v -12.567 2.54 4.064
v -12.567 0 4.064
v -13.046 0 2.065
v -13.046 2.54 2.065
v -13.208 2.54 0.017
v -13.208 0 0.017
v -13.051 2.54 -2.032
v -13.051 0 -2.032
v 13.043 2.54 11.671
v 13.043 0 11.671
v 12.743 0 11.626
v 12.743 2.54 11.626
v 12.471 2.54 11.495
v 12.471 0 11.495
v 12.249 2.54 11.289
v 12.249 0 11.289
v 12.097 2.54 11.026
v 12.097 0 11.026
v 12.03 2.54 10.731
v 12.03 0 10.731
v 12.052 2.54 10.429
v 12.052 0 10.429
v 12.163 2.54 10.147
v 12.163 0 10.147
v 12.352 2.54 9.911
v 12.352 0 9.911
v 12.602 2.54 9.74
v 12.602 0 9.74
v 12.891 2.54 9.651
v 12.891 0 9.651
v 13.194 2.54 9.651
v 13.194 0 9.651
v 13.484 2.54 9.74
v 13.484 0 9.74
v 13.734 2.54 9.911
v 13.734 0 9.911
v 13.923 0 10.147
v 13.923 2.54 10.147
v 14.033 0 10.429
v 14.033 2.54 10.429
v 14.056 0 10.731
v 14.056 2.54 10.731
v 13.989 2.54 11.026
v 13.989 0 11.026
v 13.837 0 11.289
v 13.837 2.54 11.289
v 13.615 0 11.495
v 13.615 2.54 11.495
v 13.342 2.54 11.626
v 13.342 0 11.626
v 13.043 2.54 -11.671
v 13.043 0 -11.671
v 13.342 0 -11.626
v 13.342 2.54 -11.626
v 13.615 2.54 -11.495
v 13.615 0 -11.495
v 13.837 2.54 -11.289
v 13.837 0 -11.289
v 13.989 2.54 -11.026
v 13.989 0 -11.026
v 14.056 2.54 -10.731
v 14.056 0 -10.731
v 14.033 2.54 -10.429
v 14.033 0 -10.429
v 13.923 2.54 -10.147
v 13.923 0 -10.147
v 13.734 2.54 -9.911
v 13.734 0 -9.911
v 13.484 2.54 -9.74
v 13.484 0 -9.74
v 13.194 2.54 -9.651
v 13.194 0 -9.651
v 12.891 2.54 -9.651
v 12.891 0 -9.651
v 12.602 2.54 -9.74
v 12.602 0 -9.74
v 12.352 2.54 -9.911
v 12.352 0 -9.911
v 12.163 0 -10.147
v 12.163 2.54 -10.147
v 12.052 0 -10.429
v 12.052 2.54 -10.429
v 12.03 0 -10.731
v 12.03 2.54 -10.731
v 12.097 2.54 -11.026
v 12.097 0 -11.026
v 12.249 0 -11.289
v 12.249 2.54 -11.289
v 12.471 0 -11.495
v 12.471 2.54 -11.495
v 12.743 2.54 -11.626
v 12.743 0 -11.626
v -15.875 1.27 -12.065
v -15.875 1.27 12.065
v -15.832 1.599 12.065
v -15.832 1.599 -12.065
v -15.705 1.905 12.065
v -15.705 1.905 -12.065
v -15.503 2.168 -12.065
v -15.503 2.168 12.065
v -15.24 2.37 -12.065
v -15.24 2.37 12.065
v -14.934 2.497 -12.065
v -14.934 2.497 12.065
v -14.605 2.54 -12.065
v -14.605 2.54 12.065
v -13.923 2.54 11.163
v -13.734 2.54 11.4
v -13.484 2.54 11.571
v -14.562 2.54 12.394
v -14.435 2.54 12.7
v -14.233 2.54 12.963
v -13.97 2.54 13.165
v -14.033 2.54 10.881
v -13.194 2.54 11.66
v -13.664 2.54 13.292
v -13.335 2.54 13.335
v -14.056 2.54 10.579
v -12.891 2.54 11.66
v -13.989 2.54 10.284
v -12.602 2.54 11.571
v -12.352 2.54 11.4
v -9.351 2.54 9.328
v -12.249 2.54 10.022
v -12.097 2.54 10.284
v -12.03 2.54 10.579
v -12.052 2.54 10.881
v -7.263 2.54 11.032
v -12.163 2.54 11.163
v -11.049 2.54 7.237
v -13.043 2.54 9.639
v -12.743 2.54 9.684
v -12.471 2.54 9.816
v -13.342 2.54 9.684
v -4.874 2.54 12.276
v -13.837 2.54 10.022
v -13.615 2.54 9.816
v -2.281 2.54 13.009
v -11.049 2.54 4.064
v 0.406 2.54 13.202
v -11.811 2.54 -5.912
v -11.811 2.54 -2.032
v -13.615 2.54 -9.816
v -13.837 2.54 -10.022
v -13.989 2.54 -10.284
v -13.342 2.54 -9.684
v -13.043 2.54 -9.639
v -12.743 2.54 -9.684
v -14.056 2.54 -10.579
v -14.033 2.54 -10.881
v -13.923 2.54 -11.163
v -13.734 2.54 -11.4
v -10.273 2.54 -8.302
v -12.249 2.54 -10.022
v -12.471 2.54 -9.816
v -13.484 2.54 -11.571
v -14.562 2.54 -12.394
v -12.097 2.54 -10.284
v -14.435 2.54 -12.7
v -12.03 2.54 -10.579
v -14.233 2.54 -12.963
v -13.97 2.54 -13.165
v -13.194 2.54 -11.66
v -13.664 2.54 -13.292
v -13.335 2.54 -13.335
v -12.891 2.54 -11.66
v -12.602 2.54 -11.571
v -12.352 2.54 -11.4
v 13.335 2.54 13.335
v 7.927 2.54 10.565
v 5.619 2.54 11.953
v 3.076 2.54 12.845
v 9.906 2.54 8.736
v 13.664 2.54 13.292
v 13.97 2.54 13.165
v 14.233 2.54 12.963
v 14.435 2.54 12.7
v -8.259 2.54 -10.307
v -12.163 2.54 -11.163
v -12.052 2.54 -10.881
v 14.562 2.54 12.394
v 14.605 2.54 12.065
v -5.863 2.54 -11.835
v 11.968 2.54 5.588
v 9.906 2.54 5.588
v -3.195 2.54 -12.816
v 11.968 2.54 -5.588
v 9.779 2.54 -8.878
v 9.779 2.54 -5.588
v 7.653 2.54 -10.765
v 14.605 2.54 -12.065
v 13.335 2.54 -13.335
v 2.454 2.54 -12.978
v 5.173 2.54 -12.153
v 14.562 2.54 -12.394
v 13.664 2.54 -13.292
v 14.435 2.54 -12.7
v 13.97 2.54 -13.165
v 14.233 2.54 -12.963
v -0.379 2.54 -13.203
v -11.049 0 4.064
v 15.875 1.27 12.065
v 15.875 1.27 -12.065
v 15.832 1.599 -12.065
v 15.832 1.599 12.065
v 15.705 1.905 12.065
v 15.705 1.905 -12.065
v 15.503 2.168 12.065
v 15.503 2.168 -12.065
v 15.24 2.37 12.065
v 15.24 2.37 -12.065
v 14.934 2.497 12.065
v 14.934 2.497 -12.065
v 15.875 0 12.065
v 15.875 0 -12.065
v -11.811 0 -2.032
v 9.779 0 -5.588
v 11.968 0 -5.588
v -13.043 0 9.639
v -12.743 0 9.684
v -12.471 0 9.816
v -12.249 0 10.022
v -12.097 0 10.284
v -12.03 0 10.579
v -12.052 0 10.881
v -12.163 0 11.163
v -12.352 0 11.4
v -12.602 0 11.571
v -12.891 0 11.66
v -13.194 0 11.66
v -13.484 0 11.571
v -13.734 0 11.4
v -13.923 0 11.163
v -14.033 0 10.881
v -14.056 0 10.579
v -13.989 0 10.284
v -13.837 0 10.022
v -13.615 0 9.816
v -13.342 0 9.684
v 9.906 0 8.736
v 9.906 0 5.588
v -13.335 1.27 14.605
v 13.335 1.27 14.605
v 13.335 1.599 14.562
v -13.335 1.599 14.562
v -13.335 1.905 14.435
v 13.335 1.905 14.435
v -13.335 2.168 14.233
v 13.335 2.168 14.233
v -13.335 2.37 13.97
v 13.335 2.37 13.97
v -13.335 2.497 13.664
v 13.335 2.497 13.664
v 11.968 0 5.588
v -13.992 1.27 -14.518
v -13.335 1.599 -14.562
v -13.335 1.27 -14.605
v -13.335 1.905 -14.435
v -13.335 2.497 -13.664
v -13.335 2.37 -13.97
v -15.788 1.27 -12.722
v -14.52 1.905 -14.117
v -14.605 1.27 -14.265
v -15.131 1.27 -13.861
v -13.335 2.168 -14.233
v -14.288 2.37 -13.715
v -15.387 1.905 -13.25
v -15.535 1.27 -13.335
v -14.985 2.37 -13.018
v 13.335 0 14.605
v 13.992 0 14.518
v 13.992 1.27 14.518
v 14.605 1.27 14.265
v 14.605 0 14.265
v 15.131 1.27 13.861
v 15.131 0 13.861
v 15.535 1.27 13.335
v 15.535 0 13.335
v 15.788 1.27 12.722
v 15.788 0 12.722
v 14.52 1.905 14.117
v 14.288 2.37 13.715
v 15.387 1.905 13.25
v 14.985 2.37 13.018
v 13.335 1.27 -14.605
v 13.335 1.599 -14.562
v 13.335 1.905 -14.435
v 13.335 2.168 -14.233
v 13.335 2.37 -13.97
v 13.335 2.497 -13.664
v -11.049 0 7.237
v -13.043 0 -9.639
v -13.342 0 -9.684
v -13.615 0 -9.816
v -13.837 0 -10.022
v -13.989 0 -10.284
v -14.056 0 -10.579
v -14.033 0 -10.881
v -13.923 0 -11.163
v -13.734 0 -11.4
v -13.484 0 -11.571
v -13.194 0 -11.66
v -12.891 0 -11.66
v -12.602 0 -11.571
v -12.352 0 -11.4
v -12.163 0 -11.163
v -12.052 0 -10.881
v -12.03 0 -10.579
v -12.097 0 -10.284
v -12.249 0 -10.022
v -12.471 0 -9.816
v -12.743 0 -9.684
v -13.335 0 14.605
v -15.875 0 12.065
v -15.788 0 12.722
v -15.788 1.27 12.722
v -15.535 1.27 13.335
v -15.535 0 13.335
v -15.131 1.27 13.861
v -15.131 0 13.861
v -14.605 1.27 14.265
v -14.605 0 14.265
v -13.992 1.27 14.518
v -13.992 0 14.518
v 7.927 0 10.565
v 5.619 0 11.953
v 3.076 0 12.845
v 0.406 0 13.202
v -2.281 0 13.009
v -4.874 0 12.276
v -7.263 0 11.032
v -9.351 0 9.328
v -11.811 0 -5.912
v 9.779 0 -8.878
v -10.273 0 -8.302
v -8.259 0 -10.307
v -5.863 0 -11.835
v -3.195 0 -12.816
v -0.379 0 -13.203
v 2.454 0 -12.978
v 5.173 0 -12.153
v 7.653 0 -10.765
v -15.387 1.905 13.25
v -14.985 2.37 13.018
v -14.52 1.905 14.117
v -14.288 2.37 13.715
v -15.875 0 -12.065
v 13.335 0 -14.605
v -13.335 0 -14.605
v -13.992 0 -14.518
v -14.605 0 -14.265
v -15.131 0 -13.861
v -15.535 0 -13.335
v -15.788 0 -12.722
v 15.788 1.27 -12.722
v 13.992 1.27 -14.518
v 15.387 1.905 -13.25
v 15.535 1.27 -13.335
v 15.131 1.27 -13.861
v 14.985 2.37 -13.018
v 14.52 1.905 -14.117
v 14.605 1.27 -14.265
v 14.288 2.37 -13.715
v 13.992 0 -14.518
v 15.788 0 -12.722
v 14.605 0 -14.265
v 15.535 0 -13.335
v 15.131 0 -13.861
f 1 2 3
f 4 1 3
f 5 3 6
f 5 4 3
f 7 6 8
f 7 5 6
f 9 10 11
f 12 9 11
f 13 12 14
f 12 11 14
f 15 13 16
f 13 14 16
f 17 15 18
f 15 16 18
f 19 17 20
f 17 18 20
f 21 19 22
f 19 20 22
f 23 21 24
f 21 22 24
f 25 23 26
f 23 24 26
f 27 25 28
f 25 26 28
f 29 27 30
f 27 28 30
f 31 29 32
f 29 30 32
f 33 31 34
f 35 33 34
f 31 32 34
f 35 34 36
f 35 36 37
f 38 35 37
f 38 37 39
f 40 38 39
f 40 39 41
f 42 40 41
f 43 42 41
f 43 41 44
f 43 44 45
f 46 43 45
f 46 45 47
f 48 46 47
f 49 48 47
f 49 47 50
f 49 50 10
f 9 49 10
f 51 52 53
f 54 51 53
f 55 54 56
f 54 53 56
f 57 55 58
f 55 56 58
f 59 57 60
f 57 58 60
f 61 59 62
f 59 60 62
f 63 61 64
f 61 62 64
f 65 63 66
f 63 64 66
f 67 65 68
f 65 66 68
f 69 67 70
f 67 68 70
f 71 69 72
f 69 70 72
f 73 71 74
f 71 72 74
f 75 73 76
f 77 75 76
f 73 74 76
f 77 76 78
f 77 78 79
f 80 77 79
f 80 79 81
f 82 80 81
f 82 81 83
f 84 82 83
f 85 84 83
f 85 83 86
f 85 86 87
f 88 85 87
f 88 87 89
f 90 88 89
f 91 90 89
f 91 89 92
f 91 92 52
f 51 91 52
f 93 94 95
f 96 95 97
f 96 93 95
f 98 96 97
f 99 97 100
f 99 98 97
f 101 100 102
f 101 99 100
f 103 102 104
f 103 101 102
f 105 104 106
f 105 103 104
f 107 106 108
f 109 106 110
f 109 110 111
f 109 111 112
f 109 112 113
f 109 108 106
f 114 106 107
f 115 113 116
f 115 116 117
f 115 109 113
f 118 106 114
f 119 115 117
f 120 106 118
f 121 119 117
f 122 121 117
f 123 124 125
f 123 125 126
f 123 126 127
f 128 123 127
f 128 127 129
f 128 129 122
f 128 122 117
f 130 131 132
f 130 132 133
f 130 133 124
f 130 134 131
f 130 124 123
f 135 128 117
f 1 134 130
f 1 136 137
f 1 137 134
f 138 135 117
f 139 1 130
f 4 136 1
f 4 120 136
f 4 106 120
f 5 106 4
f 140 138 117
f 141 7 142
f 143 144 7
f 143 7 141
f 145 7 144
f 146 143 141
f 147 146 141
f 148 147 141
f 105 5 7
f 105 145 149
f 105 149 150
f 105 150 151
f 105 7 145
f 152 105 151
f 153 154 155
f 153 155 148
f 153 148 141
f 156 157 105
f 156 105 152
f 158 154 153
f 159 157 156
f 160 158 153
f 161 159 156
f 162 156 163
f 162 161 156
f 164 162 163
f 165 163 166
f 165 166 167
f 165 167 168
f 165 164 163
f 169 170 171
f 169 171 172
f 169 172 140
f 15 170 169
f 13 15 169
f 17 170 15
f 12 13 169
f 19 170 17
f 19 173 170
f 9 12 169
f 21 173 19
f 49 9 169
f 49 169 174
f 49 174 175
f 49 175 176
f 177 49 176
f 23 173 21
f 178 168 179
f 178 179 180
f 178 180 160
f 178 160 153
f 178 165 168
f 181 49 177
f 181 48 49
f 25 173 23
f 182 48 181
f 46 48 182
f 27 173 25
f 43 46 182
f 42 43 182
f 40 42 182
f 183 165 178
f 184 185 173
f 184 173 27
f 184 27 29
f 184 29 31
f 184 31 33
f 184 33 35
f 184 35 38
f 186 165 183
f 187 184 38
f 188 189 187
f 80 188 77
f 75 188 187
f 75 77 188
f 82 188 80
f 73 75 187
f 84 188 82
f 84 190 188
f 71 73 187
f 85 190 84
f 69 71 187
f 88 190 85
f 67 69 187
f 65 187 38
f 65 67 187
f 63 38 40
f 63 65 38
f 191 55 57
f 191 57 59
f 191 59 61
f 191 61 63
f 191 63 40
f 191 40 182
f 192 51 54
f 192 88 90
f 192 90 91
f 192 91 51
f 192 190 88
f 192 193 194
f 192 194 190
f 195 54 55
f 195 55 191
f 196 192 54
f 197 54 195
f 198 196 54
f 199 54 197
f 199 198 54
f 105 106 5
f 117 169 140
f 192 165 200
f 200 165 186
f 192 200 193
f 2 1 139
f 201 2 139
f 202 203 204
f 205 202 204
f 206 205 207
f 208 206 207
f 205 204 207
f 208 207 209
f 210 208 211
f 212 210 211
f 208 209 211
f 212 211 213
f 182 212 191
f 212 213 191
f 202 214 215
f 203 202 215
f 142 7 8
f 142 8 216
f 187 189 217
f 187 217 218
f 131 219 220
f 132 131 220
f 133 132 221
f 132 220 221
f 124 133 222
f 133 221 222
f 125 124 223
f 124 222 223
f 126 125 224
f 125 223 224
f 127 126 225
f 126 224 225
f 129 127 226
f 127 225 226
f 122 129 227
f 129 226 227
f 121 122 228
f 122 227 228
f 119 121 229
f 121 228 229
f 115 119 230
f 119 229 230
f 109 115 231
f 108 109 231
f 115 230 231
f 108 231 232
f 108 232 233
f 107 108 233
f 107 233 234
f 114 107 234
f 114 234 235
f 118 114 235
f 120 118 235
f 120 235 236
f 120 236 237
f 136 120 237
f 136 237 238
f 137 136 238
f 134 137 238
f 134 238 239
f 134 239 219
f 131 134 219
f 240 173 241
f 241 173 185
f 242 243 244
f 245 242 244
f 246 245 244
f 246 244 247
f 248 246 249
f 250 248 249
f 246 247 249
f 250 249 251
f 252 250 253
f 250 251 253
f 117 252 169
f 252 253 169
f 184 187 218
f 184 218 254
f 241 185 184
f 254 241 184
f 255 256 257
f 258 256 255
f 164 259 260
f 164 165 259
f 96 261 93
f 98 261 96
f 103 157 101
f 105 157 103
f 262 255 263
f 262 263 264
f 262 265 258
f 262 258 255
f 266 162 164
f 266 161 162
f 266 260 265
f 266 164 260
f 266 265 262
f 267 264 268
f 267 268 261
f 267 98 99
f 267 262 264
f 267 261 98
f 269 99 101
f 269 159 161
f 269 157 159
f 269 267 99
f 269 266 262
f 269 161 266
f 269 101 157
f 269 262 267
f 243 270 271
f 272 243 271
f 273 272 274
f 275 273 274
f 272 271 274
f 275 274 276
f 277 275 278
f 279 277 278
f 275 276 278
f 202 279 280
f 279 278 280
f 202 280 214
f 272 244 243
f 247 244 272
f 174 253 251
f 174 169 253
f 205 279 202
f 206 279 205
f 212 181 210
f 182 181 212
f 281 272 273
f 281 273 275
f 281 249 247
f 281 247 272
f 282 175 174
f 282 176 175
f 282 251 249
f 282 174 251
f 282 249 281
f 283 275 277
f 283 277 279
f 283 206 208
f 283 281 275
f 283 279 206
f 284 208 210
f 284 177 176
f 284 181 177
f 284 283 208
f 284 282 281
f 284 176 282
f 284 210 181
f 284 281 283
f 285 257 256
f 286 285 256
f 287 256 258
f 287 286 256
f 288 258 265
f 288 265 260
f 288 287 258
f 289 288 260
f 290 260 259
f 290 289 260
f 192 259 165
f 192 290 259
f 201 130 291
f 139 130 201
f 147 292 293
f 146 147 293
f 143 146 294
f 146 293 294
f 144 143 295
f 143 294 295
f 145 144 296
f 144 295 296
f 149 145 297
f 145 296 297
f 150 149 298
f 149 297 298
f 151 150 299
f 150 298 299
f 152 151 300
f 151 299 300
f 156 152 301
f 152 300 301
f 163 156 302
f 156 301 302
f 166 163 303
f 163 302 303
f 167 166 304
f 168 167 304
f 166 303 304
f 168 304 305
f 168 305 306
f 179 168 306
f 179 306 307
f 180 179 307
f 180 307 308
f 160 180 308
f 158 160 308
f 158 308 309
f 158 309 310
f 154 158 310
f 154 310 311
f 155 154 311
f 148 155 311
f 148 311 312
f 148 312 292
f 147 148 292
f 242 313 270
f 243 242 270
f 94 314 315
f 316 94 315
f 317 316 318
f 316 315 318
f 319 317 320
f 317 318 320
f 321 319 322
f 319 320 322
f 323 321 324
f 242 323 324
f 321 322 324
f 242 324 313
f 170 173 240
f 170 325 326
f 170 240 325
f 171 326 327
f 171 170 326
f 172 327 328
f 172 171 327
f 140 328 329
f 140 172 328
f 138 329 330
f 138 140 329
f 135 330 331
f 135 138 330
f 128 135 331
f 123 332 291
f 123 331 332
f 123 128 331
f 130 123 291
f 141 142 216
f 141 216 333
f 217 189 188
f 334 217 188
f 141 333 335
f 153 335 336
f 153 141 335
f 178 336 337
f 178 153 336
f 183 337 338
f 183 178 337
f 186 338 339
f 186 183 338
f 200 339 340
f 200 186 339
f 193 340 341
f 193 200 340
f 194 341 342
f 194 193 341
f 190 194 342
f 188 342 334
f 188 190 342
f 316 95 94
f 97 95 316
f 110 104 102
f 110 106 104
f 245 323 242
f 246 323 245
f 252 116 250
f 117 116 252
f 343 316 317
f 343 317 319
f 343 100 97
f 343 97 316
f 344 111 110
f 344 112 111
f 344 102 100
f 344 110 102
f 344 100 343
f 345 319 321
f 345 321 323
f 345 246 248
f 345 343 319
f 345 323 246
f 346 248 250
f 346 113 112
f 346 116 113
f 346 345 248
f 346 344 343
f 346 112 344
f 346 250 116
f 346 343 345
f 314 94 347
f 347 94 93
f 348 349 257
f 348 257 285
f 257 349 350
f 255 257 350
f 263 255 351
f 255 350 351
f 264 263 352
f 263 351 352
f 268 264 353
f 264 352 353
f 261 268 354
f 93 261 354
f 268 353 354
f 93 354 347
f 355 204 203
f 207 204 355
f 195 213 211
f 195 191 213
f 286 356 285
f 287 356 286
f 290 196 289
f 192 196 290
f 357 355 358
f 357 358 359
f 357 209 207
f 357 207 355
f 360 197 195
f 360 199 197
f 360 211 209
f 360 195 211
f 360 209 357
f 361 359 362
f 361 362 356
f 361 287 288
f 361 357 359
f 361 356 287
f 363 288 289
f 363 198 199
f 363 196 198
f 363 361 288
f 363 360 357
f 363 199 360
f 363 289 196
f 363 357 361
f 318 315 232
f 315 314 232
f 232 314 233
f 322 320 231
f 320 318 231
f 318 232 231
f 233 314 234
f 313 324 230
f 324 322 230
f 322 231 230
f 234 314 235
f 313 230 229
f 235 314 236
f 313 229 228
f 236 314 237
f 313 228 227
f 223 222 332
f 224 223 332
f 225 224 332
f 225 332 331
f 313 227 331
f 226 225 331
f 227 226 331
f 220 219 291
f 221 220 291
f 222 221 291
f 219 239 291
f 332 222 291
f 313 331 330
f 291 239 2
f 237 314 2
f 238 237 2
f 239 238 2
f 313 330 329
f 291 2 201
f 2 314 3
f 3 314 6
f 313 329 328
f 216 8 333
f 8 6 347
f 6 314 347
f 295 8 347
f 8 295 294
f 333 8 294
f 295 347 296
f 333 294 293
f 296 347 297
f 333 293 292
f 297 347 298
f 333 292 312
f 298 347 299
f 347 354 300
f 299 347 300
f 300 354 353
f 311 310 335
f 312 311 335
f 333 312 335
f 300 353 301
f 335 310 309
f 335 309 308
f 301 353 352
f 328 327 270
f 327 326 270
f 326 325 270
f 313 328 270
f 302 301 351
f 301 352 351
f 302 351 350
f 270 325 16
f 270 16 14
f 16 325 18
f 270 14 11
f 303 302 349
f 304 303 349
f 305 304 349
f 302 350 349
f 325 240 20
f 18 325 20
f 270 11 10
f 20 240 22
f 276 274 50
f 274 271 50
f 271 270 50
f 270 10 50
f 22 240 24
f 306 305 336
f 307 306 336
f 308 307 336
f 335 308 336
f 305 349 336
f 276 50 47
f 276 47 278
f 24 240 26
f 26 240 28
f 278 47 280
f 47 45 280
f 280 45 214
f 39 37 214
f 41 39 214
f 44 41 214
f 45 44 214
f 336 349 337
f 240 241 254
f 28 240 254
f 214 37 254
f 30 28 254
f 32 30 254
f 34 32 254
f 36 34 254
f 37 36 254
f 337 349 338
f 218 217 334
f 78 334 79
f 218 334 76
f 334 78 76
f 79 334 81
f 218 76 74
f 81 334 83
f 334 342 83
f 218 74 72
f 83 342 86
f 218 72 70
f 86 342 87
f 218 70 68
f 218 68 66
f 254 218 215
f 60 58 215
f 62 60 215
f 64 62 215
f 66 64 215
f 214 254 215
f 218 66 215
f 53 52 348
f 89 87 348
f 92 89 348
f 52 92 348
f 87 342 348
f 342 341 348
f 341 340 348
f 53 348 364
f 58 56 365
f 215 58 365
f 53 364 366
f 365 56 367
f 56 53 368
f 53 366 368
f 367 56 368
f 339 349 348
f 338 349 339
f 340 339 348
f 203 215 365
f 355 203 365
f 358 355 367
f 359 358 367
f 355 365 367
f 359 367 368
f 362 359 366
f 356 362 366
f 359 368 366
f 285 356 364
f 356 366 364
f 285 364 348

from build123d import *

# Parameters (mm, degrees)
SKETCH1_W           = 31.75
SKETCH1_H           = 29.21
BOSS_EXTRUDE1_DEPTH = 2.54
CUT_EXTRUDE1_DEPTH  = 22.720341848
SKETCH3_W           = 4.064
SKETCH3_H           = 4.263952617
SKETCH3_W_2         = 4.826
SKETCH3_H_2         = 10.541
SKETCH3_W_3         = 5.969
SKETCH3_H_3         = 4.464530762
SKETCH3_W_4         = 6.096
SKETCH3_H_4         = 4.639521707
BOSS_EXTRUDE2_DEPTH = 2.54
FILLET1_R           = 1.27
SKETCH5_R           = 1.016
CUT_EXTRUDE3_DEPTH  = 22.720341848
FILLET2_R           = 2.54


with BuildPart() as part:
    # Sketch1 → Boss-Extrude1 (new body)
    with BuildSketch(Plane(origin=(0, 0, 0), x_dir=(1, 0, 0), z_dir=(0, 1, 0))):
        Rectangle(SKETCH1_W, SKETCH1_H)
    extrude(amount=BOSS_EXTRUDE1_DEPTH)

    # Sketch2 → Cut-Extrude1 (cut, through all)
    with BuildSketch(Plane(origin=(0, 2.54, 0), x_dir=(1, 0, 0), z_dir=(0, 1, 0))):
        with BuildLine():
            Line((11.967686493, 5.588), (11.967686493, -5.588))
            ThreePointArc((11.967686493, -5.588), (-13.208, 0), (11.967686493, 5.588))
        make_face()
    extrude(amount=-CUT_EXTRUDE1_DEPTH, mode=Mode.SUBTRACT)

    # Sketch3 → Boss-Extrude2 (add)
    with BuildSketch(Plane(origin=(0, 2.54, 0), x_dir=(1, 0, 0), z_dir=(0, 1, 0))):
        with Locations((-13.843, 4.163976309)):
            Rectangle(SKETCH3_W, SKETCH3_H)
        with Locations((-13.462, -9.3345)):
            Rectangle(SKETCH3_W_2, SKETCH3_H_2)
        with Locations((12.8905, -7.820265381)):
            Rectangle(SKETCH3_W_3, SKETCH3_H_3)
        with Locations((12.827, 7.907760854)):
            Rectangle(SKETCH3_W_4, SKETCH3_H_4)
    extrude(amount=-BOSS_EXTRUDE2_DEPTH)

    # Fillet1
    fillet1_edges = [part.edges().sort_by_distance(p)[0] for p in [
        (15.875, 2.54, 0),
        (0, 2.54, -14.605),
        (-15.875, 2.54, 0),
        (0, 2.54, 14.605),
    ]]
    fillet(fillet1_edges, radius=FILLET1_R)

    # Sketch5 → Cut-Extrude3 (cut, through all)
    with BuildSketch(Plane.XZ):
        with Locations(Location((13.0429, -10.6553, 0), (0, 0, 270))):
            Circle(SKETCH5_R)
        with Locations(Location((-13.0429, -10.6553, 0), (0, 0, 90))):
            Circle(SKETCH5_R)
        with Locations(Location((-13.0429, 10.6553, 0), (0, 0, 270))):
            Circle(SKETCH5_R)
        with Locations(Location((13.0429, 10.6553, 0), (0, 0, 90))):
            Circle(SKETCH5_R)
    extrude(amount=-CUT_EXTRUDE3_DEPTH, mode=Mode.SUBTRACT)

    # Fillet2
    # the kernel refuses this fillet: 2.54 mm, written as the material it takes off along each edge
    with BuildSketch(Plane(origin=(13.335, 2.54, -12.065), x_dir=(1, 0, 0), z_dir=(0, 0, 1))) as fillet2_piece_1:
        with BuildLine():
            CenterArc((1.27, -1.27), 1.27, 0, 90)
            Line((2.54, -1.27), (2.54, 0))
            Line((2.54, 0), (1.27, 0))
        make_face()
    revolve(axis=Axis((13.335, 2.54, -12.065), (0, 1, 0)), revolution_arc=90, mode=Mode.SUBTRACT)
    with BuildSketch(Plane(origin=(13.335, 2.54, 12.065), x_dir=(0, 0, 1), z_dir=(-1, 0, 0))) as fillet2_piece_2:
        with BuildLine():
            CenterArc((1.27, -1.27), 1.27, 0, 90)
            Line((2.54, -1.27), (2.54, 0))
            Line((2.54, 0), (1.27, 0))
        make_face()
    revolve(axis=Axis((13.335, 2.54, 12.065), (0, 1, 0)), revolution_arc=90, mode=Mode.SUBTRACT)
    with BuildSketch(Plane(origin=(-13.335, 2.54, -12.065), x_dir=(0, 0, -1), z_dir=(1, 0, 0))) as fillet2_piece_3:
        with BuildLine():
            CenterArc((1.27, -1.27), 1.27, 0, 90)
            Line((2.54, -1.27), (2.54, 0))
            Line((2.54, 0), (1.27, 0))
        make_face()
    revolve(axis=Axis((-13.335, 2.54, -12.065), (0, 1, 0)), revolution_arc=90, mode=Mode.SUBTRACT)
    with BuildSketch(Plane(origin=(-13.335, 2.54, 12.065), x_dir=(-1, 0, 0), z_dir=(0, 0, -1))) as fillet2_piece_4:
        with BuildLine():
            CenterArc((1.27, -1.27), 1.27, 0, 90)
            Line((2.54, -1.27), (2.54, 0))
            Line((2.54, 0), (1.27, 0))
        make_face()
    revolve(axis=Axis((-13.335, 2.54, 12.065), (0, 1, 0)), revolution_arc=90, mode=Mode.SUBTRACT)
    with BuildSketch(Plane(origin=(-15.875, -6.35, 14.605), x_dir=(0, 0, -1), z_dir=(0, 1, 0)), Plane(origin=(-15.875, -6.35, -14.605), x_dir=(1, 0, 0), z_dir=(0, 1, 0))) as fillet2_piece_5:
        with BuildLine():
            CenterArc((FILLET2_R, -FILLET2_R), FILLET2_R, 90, 90)
            Line((0, -FILLET2_R), (0, 0))
            Line((0, 0), (FILLET2_R, 0))
        make_face()
    extrude(amount=8.89, mode=Mode.SUBTRACT)
    with BuildSketch(Plane(origin=(15.875, -6.35, -14.605), x_dir=(-1, 0, 0), z_dir=(0, 1, 0)), Plane(origin=(15.875, -6.35, 14.605), x_dir=(0, 0, -1), z_dir=(0, 1, 0))) as fillet2_piece_6:
        with BuildLine():
            CenterArc((FILLET2_R, FILLET2_R), FILLET2_R, 180, 90)
            Line((0, FILLET2_R), (0, 0))
            Line((0, 0), (FILLET2_R, 0))
        make_face()
    extrude(amount=8.89, mode=Mode.SUBTRACT)


solid = part.part
